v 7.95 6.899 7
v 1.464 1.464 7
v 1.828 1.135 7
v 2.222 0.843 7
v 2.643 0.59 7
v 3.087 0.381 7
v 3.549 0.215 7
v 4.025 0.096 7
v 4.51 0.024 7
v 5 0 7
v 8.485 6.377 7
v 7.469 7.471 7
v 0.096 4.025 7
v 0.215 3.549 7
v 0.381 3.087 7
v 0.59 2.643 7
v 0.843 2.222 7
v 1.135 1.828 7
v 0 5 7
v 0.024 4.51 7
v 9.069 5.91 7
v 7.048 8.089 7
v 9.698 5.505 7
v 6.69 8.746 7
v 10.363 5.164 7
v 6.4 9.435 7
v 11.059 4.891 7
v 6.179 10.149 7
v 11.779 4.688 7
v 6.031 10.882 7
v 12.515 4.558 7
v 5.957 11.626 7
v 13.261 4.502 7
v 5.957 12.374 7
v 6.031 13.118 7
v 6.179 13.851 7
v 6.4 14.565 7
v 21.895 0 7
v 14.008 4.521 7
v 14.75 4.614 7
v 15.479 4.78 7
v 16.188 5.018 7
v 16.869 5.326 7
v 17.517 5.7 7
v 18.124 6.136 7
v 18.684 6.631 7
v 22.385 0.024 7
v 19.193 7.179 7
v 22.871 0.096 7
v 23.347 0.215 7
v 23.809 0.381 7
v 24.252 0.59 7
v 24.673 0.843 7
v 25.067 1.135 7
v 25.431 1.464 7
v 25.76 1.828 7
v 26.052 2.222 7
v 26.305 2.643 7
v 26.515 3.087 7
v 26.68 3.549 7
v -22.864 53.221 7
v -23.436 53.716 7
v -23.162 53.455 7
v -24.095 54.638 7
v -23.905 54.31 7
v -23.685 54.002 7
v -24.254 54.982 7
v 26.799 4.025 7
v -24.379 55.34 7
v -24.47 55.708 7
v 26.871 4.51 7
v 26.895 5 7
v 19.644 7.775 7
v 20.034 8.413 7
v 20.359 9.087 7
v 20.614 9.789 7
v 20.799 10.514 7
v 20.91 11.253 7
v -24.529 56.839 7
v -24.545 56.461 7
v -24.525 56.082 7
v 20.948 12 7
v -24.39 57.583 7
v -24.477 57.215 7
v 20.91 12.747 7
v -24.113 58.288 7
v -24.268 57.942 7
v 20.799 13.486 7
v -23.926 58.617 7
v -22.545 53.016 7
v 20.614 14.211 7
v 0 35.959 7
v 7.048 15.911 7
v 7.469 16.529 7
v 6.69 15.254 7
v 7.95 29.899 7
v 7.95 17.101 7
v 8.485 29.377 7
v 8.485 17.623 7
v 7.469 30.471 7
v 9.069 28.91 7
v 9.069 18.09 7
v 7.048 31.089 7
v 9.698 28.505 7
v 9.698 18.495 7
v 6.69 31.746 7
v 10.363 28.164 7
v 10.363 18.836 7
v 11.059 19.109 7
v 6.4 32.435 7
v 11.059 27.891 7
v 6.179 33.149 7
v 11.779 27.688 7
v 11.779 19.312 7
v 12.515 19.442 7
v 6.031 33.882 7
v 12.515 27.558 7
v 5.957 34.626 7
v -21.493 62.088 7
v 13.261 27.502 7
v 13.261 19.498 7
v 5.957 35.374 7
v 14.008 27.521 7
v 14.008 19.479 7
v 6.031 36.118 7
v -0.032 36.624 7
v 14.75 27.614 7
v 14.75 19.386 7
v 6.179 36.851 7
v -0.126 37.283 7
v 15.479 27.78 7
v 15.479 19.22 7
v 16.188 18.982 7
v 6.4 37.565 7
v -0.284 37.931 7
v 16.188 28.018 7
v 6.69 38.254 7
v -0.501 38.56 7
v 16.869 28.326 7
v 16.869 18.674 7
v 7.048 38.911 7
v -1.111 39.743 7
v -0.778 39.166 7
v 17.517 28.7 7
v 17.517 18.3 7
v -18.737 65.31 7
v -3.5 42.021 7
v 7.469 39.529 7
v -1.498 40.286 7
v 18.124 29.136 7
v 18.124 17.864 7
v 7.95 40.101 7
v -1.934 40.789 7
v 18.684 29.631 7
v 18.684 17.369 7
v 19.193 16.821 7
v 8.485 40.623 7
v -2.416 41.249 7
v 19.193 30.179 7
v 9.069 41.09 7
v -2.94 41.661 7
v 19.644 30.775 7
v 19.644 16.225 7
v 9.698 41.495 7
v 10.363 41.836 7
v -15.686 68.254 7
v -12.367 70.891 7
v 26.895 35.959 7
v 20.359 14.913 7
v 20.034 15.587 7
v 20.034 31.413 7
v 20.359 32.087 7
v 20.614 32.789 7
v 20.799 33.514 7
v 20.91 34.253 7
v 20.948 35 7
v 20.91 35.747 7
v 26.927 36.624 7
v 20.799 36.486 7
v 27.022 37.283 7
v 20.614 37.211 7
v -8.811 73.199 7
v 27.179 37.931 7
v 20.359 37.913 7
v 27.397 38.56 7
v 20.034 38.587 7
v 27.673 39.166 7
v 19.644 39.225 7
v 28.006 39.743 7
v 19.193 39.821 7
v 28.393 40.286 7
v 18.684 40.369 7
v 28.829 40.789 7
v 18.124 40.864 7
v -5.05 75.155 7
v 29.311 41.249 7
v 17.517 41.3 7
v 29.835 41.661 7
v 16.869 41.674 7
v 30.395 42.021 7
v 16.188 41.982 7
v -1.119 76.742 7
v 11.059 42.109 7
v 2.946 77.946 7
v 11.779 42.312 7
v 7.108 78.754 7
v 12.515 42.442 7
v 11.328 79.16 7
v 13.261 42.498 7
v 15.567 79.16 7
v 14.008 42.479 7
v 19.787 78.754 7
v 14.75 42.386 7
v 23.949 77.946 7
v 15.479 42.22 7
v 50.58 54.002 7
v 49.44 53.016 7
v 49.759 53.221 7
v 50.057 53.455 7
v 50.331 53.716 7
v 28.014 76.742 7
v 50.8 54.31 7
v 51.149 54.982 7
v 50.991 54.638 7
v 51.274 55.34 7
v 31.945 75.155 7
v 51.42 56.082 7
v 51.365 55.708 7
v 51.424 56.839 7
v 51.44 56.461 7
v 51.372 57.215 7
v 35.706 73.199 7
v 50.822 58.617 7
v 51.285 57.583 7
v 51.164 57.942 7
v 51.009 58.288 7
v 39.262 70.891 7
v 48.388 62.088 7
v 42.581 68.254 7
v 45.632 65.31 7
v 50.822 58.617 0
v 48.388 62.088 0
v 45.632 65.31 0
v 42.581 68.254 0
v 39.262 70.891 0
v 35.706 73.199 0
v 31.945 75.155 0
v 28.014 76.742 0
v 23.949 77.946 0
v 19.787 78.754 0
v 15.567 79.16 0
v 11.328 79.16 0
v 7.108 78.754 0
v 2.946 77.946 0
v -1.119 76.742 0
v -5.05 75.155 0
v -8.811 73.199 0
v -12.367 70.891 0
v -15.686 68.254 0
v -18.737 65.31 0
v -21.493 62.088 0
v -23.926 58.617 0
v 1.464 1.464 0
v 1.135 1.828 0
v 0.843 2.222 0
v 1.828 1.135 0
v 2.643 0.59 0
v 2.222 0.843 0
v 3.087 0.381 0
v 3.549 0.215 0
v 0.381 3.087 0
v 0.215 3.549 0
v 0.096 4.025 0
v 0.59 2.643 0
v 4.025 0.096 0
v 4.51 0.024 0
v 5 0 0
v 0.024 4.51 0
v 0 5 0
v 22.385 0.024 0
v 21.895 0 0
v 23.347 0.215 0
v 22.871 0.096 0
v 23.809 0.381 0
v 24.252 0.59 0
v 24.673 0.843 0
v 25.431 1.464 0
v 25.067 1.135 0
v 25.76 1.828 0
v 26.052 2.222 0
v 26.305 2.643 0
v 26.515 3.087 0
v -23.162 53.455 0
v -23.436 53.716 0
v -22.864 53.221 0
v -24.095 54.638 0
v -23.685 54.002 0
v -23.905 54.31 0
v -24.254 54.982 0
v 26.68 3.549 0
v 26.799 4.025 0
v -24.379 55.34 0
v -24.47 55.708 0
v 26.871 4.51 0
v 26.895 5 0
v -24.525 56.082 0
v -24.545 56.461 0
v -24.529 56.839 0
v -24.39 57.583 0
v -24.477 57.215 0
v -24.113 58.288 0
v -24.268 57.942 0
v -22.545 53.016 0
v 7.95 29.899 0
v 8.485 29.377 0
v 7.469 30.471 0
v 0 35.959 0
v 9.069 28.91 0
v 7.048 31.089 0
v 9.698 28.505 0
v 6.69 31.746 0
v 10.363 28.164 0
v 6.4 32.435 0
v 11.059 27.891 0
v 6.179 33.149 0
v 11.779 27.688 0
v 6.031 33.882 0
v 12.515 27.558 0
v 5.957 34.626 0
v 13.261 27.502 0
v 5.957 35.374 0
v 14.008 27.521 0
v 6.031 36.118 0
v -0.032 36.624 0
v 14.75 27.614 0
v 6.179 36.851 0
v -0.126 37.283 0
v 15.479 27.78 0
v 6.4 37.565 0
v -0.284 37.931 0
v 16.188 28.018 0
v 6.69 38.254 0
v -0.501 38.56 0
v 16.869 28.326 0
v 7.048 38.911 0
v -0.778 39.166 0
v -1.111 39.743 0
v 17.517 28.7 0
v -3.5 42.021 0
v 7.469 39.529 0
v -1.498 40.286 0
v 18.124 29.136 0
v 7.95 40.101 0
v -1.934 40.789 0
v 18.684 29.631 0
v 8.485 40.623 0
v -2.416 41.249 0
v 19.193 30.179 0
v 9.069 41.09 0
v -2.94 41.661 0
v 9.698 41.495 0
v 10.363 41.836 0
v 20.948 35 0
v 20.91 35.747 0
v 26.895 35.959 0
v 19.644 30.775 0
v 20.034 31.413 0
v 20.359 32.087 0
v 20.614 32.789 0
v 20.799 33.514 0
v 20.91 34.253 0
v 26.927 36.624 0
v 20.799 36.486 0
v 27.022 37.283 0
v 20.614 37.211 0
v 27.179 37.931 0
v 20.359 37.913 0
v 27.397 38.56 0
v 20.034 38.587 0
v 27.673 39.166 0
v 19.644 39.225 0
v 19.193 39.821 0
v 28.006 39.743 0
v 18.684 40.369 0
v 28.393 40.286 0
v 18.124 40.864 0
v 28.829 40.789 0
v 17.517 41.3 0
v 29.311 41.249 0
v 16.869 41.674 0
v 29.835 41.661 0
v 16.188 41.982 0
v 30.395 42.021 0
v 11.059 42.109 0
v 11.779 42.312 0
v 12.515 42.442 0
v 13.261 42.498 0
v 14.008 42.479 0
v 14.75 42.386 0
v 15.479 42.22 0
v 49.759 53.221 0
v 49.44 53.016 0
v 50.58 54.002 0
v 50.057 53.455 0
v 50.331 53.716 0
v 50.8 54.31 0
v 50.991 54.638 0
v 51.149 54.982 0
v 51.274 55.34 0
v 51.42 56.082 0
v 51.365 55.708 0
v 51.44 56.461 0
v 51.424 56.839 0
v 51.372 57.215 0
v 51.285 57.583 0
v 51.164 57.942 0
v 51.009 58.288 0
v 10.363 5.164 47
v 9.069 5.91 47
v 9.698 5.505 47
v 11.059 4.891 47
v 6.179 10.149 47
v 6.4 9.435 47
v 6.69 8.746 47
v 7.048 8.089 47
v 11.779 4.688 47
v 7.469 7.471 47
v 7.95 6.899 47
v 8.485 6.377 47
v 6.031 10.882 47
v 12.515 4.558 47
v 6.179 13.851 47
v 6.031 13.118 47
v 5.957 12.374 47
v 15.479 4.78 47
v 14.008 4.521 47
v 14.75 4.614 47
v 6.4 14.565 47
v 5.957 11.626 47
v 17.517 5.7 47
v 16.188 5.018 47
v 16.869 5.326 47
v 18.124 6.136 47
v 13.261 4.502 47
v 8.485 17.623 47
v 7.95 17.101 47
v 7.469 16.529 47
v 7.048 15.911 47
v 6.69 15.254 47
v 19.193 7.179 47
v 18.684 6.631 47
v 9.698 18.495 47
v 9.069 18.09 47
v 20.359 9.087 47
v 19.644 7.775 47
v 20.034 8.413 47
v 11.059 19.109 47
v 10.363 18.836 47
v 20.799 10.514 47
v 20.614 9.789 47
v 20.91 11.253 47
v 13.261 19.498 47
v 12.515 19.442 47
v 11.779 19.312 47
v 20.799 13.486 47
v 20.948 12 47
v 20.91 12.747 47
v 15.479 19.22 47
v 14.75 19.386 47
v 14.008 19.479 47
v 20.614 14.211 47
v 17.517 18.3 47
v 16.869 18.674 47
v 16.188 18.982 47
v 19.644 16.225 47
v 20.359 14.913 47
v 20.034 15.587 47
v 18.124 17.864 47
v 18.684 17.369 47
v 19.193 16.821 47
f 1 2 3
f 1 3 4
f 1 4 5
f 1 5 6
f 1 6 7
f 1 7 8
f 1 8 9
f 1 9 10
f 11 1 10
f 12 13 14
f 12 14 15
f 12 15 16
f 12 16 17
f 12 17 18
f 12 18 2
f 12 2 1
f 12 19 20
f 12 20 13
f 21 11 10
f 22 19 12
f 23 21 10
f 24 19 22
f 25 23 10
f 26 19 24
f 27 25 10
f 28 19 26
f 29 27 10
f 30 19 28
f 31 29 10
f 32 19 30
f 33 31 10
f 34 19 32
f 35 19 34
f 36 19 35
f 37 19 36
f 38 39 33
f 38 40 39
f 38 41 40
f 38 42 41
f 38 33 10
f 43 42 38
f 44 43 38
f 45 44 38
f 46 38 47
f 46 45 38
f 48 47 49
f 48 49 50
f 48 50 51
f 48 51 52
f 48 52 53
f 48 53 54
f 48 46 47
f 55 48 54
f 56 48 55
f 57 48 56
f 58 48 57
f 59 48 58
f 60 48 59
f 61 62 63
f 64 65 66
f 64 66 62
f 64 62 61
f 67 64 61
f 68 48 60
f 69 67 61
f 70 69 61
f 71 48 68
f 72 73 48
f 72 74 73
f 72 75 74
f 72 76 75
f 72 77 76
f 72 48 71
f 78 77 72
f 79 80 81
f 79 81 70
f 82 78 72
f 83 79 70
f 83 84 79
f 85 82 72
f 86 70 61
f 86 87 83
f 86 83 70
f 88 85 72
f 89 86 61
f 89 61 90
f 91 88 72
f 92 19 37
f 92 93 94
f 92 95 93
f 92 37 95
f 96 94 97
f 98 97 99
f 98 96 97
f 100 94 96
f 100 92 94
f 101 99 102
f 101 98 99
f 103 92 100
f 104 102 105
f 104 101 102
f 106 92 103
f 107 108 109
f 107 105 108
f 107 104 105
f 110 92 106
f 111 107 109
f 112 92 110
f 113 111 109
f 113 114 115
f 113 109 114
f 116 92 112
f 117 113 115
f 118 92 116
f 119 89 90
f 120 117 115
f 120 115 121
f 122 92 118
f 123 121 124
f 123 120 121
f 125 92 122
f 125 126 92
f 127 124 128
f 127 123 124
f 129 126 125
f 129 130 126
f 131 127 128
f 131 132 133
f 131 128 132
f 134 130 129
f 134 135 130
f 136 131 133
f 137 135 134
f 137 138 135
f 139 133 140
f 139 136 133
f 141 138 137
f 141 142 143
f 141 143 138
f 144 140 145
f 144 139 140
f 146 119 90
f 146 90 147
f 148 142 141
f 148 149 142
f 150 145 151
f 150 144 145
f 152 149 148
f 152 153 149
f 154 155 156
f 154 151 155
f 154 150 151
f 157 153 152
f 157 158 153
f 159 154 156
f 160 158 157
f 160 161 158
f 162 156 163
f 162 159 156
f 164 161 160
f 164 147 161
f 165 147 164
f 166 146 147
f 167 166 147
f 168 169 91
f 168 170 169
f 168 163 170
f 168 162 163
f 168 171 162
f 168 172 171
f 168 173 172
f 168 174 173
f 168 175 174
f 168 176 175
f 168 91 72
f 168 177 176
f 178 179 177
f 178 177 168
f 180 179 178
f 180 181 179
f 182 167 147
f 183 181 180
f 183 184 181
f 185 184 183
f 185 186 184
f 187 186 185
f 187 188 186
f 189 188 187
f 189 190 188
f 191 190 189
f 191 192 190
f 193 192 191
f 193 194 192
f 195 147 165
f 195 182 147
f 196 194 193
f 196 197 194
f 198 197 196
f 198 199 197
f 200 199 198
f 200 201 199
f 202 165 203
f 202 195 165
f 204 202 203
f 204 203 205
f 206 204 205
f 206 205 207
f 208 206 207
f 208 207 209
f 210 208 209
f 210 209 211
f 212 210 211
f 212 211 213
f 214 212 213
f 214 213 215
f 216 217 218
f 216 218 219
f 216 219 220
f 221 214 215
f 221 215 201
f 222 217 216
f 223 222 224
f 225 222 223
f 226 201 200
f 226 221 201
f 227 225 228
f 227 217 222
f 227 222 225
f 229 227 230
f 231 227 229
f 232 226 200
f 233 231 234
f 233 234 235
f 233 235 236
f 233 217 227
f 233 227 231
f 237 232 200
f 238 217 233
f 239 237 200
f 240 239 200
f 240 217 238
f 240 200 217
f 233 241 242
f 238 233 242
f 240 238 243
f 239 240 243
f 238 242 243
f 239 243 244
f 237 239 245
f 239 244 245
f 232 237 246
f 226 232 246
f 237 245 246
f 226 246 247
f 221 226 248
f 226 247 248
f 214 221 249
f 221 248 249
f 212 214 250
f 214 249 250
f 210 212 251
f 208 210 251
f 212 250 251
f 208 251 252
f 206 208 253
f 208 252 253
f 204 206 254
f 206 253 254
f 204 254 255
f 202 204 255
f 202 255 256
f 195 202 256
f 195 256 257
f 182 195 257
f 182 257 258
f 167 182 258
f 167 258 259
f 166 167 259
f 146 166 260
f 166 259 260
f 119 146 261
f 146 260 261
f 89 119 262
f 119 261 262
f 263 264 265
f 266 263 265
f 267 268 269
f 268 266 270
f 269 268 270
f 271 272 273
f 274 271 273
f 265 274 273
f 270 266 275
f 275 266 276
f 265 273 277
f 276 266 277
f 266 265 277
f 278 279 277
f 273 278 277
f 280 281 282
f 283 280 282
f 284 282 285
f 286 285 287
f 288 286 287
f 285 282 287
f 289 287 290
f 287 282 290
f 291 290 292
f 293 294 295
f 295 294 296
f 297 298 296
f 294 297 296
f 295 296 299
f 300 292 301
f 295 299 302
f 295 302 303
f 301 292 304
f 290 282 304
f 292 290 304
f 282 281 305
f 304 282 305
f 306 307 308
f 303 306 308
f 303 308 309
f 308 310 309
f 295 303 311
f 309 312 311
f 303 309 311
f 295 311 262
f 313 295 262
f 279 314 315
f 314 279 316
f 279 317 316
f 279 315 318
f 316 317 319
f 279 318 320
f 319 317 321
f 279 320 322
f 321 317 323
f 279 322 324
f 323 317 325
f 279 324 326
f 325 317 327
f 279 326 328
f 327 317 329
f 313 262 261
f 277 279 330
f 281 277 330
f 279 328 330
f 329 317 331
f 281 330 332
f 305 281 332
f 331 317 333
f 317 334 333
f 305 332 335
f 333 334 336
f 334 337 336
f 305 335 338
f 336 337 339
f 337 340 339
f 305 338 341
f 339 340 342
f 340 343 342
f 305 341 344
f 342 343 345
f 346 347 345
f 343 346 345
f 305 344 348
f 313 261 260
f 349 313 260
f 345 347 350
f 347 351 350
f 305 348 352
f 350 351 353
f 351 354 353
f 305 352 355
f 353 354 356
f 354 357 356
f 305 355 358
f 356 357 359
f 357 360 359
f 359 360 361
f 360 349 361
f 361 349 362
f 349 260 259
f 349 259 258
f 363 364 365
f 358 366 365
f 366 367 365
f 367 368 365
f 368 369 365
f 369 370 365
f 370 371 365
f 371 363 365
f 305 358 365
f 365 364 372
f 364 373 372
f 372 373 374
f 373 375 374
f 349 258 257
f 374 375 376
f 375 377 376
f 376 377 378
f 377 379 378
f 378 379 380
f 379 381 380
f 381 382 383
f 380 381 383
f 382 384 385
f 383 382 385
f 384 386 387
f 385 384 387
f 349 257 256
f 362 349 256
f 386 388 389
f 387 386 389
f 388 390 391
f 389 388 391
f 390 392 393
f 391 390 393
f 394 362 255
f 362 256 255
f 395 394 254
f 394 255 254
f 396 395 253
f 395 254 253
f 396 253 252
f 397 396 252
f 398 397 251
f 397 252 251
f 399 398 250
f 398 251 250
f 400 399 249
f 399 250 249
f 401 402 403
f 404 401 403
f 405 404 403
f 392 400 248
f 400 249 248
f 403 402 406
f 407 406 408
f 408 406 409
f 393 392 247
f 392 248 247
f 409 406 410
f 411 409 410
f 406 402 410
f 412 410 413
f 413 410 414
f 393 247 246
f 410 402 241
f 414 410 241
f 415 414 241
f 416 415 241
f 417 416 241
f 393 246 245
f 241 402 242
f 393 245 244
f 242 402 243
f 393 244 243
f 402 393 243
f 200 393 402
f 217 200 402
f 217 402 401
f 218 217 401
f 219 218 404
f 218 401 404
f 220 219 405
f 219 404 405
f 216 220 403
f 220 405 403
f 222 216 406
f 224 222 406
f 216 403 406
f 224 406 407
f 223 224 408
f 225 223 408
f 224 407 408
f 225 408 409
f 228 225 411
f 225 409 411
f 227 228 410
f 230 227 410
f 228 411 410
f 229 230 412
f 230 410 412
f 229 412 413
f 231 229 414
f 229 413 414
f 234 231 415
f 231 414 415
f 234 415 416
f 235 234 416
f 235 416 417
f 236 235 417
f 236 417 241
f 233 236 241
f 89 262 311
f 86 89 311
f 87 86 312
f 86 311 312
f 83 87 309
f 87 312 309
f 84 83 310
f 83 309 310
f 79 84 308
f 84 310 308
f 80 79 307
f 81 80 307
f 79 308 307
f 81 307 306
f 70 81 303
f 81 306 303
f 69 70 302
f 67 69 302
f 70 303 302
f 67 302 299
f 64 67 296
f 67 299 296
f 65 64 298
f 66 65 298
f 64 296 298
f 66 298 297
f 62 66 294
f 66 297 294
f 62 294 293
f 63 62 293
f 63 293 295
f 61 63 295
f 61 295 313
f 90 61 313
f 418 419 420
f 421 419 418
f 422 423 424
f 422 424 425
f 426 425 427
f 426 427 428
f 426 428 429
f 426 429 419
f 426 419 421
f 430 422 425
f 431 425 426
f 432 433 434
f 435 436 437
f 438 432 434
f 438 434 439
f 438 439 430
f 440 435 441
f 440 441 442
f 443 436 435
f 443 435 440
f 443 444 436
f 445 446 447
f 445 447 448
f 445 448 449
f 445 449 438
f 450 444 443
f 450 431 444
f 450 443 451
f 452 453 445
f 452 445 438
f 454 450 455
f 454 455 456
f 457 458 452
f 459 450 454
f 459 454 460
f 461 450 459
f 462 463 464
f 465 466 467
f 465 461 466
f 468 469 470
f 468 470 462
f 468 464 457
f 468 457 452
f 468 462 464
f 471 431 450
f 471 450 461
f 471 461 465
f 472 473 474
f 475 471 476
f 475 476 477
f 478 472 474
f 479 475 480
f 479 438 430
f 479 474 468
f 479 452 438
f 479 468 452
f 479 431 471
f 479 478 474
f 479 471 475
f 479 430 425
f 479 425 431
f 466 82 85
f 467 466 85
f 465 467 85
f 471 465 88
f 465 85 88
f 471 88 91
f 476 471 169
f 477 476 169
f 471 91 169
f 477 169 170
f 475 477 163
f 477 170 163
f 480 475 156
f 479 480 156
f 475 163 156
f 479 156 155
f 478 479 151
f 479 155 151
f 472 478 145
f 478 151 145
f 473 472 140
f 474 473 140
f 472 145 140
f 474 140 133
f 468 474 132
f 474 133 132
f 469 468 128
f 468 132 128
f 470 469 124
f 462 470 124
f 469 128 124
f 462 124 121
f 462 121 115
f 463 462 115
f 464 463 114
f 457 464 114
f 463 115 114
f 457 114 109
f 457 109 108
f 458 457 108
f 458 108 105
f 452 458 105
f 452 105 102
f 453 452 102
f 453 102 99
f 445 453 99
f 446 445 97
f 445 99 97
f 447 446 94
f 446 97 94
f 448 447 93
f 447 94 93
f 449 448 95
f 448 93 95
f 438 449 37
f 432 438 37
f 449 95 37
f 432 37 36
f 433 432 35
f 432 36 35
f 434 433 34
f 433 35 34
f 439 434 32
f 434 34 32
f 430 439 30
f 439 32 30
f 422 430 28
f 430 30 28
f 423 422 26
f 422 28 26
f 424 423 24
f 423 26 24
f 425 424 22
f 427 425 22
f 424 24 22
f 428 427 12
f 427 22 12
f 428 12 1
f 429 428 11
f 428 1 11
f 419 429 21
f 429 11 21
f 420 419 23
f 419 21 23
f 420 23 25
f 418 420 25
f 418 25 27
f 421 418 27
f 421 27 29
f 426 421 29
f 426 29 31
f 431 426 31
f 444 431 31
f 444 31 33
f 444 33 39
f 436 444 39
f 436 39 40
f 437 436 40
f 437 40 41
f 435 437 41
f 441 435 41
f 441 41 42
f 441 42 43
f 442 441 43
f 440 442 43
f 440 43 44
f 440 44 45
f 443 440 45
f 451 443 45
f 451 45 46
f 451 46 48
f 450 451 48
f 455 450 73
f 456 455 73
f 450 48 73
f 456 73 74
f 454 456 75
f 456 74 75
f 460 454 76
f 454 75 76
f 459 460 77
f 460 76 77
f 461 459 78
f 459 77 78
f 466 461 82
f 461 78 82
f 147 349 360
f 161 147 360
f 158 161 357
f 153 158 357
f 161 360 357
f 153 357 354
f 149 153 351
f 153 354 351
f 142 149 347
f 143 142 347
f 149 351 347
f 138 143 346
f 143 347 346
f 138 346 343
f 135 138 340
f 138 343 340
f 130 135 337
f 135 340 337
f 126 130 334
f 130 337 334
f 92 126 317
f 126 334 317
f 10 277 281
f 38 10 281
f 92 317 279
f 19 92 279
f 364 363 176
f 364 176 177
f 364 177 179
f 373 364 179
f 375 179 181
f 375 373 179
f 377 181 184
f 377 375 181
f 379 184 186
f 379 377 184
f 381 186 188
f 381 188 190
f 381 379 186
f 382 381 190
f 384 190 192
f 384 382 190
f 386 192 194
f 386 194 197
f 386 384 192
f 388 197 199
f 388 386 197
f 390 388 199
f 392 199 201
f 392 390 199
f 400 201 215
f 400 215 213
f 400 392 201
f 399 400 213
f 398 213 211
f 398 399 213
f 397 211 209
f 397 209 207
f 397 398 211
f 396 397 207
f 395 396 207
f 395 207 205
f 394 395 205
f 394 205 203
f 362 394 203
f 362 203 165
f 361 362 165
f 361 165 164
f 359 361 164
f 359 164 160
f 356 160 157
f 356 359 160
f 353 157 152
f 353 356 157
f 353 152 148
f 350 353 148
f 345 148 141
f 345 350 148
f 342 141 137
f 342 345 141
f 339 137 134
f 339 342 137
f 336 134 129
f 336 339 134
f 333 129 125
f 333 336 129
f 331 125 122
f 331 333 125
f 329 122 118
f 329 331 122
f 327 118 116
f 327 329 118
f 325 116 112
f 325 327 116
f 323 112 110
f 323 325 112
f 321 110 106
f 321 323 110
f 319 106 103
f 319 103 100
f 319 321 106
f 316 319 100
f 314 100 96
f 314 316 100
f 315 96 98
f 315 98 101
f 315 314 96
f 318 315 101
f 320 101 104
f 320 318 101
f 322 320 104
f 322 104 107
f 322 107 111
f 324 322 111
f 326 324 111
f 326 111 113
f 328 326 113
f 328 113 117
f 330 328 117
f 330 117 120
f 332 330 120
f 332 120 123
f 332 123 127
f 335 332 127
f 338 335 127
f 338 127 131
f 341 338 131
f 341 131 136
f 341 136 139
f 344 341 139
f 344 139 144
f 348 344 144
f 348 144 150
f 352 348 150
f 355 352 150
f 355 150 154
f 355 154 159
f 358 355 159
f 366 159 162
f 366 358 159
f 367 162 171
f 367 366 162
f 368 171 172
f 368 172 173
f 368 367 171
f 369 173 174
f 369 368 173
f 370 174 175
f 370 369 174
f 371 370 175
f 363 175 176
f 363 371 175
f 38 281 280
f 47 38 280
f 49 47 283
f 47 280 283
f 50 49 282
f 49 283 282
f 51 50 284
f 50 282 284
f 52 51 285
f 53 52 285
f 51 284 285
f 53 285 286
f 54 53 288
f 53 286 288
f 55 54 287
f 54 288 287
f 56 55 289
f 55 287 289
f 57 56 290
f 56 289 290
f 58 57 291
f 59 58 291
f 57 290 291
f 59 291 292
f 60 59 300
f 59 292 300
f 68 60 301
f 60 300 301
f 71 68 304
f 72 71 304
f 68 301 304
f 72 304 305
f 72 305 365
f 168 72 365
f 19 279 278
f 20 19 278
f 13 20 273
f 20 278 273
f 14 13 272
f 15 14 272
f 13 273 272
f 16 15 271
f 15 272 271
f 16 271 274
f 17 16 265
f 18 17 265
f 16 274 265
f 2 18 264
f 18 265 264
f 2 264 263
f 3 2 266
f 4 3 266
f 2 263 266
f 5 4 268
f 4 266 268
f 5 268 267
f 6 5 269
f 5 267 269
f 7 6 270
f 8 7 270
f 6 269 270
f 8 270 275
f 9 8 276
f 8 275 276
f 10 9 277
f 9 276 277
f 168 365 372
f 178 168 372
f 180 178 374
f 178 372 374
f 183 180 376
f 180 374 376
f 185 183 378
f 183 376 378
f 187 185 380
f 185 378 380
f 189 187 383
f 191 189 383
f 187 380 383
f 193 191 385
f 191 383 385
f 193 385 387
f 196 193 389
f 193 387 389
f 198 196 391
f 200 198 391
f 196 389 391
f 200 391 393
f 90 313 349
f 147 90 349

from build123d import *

# Parameters (mm, degrees)
SKETCH2_R           = 7.5
BOSS_EXTRUDE5_DEPTH = 7
SKETCH3_R           = 7.5
BOSS_EXTRUDE6_DEPTH = 40


with BuildPart() as part:
    # Sketch2 → Boss-Extrude5 (new body)
    with BuildSketch(Plane.XY):
        with BuildLine():
            Line((5, 0), (21.89510984, 0))
            ThreePointArc((21.89510984, 0), (25.430643746, 1.464466094), (26.89510984, 5))
            Line((26.89510984, 5), (26.89510984, 35.958548116))
            ThreePointArc((26.89510984, 35.958548116), (27.832932013, 39.458548116), (30.39510984, 42.020725942))
            Line((30.39510984, 42.020725942), (49.440130583, 53.016373795))
            ThreePointArc((49.440130583, 53.016373795), (51.323745621, 55.522595335), (50.821570497, 58.61726368))
            ThreePointArc((50.821570497, 58.61726368), (13.44755492, 79.210770001), (-23.926460657, 58.61726368))
            ThreePointArc((-23.926460657, 58.61726368), (-24.428635781, 55.522595335), (-22.545020743, 53.016373795))
            Line((-22.545020743, 53.016373795), (-3.5, 42.020725942))
            ThreePointArc((-3.5, 42.020725942), (-0.937822174, 39.458548116), (0, 35.958548116))
            Line((0, 35.958548116), (0, 5))
            ThreePointArc((0, 5), (1.464466094, 1.464466094), (5, 0))
        make_face()
        with Locations((13.44755492, 35)):
            Circle(SKETCH2_R, mode=Mode.SUBTRACT)
    extrude(amount=BOSS_EXTRUDE5_DEPTH)

    # Sketch3 → Boss-Extrude6 (add)
    with BuildSketch(Plane.XY.offset(7)):
        with Locations((13.44755492, 12)):
            Circle(SKETCH3_R)
    extrude(amount=BOSS_EXTRUDE6_DEPTH)


solid = part.part
